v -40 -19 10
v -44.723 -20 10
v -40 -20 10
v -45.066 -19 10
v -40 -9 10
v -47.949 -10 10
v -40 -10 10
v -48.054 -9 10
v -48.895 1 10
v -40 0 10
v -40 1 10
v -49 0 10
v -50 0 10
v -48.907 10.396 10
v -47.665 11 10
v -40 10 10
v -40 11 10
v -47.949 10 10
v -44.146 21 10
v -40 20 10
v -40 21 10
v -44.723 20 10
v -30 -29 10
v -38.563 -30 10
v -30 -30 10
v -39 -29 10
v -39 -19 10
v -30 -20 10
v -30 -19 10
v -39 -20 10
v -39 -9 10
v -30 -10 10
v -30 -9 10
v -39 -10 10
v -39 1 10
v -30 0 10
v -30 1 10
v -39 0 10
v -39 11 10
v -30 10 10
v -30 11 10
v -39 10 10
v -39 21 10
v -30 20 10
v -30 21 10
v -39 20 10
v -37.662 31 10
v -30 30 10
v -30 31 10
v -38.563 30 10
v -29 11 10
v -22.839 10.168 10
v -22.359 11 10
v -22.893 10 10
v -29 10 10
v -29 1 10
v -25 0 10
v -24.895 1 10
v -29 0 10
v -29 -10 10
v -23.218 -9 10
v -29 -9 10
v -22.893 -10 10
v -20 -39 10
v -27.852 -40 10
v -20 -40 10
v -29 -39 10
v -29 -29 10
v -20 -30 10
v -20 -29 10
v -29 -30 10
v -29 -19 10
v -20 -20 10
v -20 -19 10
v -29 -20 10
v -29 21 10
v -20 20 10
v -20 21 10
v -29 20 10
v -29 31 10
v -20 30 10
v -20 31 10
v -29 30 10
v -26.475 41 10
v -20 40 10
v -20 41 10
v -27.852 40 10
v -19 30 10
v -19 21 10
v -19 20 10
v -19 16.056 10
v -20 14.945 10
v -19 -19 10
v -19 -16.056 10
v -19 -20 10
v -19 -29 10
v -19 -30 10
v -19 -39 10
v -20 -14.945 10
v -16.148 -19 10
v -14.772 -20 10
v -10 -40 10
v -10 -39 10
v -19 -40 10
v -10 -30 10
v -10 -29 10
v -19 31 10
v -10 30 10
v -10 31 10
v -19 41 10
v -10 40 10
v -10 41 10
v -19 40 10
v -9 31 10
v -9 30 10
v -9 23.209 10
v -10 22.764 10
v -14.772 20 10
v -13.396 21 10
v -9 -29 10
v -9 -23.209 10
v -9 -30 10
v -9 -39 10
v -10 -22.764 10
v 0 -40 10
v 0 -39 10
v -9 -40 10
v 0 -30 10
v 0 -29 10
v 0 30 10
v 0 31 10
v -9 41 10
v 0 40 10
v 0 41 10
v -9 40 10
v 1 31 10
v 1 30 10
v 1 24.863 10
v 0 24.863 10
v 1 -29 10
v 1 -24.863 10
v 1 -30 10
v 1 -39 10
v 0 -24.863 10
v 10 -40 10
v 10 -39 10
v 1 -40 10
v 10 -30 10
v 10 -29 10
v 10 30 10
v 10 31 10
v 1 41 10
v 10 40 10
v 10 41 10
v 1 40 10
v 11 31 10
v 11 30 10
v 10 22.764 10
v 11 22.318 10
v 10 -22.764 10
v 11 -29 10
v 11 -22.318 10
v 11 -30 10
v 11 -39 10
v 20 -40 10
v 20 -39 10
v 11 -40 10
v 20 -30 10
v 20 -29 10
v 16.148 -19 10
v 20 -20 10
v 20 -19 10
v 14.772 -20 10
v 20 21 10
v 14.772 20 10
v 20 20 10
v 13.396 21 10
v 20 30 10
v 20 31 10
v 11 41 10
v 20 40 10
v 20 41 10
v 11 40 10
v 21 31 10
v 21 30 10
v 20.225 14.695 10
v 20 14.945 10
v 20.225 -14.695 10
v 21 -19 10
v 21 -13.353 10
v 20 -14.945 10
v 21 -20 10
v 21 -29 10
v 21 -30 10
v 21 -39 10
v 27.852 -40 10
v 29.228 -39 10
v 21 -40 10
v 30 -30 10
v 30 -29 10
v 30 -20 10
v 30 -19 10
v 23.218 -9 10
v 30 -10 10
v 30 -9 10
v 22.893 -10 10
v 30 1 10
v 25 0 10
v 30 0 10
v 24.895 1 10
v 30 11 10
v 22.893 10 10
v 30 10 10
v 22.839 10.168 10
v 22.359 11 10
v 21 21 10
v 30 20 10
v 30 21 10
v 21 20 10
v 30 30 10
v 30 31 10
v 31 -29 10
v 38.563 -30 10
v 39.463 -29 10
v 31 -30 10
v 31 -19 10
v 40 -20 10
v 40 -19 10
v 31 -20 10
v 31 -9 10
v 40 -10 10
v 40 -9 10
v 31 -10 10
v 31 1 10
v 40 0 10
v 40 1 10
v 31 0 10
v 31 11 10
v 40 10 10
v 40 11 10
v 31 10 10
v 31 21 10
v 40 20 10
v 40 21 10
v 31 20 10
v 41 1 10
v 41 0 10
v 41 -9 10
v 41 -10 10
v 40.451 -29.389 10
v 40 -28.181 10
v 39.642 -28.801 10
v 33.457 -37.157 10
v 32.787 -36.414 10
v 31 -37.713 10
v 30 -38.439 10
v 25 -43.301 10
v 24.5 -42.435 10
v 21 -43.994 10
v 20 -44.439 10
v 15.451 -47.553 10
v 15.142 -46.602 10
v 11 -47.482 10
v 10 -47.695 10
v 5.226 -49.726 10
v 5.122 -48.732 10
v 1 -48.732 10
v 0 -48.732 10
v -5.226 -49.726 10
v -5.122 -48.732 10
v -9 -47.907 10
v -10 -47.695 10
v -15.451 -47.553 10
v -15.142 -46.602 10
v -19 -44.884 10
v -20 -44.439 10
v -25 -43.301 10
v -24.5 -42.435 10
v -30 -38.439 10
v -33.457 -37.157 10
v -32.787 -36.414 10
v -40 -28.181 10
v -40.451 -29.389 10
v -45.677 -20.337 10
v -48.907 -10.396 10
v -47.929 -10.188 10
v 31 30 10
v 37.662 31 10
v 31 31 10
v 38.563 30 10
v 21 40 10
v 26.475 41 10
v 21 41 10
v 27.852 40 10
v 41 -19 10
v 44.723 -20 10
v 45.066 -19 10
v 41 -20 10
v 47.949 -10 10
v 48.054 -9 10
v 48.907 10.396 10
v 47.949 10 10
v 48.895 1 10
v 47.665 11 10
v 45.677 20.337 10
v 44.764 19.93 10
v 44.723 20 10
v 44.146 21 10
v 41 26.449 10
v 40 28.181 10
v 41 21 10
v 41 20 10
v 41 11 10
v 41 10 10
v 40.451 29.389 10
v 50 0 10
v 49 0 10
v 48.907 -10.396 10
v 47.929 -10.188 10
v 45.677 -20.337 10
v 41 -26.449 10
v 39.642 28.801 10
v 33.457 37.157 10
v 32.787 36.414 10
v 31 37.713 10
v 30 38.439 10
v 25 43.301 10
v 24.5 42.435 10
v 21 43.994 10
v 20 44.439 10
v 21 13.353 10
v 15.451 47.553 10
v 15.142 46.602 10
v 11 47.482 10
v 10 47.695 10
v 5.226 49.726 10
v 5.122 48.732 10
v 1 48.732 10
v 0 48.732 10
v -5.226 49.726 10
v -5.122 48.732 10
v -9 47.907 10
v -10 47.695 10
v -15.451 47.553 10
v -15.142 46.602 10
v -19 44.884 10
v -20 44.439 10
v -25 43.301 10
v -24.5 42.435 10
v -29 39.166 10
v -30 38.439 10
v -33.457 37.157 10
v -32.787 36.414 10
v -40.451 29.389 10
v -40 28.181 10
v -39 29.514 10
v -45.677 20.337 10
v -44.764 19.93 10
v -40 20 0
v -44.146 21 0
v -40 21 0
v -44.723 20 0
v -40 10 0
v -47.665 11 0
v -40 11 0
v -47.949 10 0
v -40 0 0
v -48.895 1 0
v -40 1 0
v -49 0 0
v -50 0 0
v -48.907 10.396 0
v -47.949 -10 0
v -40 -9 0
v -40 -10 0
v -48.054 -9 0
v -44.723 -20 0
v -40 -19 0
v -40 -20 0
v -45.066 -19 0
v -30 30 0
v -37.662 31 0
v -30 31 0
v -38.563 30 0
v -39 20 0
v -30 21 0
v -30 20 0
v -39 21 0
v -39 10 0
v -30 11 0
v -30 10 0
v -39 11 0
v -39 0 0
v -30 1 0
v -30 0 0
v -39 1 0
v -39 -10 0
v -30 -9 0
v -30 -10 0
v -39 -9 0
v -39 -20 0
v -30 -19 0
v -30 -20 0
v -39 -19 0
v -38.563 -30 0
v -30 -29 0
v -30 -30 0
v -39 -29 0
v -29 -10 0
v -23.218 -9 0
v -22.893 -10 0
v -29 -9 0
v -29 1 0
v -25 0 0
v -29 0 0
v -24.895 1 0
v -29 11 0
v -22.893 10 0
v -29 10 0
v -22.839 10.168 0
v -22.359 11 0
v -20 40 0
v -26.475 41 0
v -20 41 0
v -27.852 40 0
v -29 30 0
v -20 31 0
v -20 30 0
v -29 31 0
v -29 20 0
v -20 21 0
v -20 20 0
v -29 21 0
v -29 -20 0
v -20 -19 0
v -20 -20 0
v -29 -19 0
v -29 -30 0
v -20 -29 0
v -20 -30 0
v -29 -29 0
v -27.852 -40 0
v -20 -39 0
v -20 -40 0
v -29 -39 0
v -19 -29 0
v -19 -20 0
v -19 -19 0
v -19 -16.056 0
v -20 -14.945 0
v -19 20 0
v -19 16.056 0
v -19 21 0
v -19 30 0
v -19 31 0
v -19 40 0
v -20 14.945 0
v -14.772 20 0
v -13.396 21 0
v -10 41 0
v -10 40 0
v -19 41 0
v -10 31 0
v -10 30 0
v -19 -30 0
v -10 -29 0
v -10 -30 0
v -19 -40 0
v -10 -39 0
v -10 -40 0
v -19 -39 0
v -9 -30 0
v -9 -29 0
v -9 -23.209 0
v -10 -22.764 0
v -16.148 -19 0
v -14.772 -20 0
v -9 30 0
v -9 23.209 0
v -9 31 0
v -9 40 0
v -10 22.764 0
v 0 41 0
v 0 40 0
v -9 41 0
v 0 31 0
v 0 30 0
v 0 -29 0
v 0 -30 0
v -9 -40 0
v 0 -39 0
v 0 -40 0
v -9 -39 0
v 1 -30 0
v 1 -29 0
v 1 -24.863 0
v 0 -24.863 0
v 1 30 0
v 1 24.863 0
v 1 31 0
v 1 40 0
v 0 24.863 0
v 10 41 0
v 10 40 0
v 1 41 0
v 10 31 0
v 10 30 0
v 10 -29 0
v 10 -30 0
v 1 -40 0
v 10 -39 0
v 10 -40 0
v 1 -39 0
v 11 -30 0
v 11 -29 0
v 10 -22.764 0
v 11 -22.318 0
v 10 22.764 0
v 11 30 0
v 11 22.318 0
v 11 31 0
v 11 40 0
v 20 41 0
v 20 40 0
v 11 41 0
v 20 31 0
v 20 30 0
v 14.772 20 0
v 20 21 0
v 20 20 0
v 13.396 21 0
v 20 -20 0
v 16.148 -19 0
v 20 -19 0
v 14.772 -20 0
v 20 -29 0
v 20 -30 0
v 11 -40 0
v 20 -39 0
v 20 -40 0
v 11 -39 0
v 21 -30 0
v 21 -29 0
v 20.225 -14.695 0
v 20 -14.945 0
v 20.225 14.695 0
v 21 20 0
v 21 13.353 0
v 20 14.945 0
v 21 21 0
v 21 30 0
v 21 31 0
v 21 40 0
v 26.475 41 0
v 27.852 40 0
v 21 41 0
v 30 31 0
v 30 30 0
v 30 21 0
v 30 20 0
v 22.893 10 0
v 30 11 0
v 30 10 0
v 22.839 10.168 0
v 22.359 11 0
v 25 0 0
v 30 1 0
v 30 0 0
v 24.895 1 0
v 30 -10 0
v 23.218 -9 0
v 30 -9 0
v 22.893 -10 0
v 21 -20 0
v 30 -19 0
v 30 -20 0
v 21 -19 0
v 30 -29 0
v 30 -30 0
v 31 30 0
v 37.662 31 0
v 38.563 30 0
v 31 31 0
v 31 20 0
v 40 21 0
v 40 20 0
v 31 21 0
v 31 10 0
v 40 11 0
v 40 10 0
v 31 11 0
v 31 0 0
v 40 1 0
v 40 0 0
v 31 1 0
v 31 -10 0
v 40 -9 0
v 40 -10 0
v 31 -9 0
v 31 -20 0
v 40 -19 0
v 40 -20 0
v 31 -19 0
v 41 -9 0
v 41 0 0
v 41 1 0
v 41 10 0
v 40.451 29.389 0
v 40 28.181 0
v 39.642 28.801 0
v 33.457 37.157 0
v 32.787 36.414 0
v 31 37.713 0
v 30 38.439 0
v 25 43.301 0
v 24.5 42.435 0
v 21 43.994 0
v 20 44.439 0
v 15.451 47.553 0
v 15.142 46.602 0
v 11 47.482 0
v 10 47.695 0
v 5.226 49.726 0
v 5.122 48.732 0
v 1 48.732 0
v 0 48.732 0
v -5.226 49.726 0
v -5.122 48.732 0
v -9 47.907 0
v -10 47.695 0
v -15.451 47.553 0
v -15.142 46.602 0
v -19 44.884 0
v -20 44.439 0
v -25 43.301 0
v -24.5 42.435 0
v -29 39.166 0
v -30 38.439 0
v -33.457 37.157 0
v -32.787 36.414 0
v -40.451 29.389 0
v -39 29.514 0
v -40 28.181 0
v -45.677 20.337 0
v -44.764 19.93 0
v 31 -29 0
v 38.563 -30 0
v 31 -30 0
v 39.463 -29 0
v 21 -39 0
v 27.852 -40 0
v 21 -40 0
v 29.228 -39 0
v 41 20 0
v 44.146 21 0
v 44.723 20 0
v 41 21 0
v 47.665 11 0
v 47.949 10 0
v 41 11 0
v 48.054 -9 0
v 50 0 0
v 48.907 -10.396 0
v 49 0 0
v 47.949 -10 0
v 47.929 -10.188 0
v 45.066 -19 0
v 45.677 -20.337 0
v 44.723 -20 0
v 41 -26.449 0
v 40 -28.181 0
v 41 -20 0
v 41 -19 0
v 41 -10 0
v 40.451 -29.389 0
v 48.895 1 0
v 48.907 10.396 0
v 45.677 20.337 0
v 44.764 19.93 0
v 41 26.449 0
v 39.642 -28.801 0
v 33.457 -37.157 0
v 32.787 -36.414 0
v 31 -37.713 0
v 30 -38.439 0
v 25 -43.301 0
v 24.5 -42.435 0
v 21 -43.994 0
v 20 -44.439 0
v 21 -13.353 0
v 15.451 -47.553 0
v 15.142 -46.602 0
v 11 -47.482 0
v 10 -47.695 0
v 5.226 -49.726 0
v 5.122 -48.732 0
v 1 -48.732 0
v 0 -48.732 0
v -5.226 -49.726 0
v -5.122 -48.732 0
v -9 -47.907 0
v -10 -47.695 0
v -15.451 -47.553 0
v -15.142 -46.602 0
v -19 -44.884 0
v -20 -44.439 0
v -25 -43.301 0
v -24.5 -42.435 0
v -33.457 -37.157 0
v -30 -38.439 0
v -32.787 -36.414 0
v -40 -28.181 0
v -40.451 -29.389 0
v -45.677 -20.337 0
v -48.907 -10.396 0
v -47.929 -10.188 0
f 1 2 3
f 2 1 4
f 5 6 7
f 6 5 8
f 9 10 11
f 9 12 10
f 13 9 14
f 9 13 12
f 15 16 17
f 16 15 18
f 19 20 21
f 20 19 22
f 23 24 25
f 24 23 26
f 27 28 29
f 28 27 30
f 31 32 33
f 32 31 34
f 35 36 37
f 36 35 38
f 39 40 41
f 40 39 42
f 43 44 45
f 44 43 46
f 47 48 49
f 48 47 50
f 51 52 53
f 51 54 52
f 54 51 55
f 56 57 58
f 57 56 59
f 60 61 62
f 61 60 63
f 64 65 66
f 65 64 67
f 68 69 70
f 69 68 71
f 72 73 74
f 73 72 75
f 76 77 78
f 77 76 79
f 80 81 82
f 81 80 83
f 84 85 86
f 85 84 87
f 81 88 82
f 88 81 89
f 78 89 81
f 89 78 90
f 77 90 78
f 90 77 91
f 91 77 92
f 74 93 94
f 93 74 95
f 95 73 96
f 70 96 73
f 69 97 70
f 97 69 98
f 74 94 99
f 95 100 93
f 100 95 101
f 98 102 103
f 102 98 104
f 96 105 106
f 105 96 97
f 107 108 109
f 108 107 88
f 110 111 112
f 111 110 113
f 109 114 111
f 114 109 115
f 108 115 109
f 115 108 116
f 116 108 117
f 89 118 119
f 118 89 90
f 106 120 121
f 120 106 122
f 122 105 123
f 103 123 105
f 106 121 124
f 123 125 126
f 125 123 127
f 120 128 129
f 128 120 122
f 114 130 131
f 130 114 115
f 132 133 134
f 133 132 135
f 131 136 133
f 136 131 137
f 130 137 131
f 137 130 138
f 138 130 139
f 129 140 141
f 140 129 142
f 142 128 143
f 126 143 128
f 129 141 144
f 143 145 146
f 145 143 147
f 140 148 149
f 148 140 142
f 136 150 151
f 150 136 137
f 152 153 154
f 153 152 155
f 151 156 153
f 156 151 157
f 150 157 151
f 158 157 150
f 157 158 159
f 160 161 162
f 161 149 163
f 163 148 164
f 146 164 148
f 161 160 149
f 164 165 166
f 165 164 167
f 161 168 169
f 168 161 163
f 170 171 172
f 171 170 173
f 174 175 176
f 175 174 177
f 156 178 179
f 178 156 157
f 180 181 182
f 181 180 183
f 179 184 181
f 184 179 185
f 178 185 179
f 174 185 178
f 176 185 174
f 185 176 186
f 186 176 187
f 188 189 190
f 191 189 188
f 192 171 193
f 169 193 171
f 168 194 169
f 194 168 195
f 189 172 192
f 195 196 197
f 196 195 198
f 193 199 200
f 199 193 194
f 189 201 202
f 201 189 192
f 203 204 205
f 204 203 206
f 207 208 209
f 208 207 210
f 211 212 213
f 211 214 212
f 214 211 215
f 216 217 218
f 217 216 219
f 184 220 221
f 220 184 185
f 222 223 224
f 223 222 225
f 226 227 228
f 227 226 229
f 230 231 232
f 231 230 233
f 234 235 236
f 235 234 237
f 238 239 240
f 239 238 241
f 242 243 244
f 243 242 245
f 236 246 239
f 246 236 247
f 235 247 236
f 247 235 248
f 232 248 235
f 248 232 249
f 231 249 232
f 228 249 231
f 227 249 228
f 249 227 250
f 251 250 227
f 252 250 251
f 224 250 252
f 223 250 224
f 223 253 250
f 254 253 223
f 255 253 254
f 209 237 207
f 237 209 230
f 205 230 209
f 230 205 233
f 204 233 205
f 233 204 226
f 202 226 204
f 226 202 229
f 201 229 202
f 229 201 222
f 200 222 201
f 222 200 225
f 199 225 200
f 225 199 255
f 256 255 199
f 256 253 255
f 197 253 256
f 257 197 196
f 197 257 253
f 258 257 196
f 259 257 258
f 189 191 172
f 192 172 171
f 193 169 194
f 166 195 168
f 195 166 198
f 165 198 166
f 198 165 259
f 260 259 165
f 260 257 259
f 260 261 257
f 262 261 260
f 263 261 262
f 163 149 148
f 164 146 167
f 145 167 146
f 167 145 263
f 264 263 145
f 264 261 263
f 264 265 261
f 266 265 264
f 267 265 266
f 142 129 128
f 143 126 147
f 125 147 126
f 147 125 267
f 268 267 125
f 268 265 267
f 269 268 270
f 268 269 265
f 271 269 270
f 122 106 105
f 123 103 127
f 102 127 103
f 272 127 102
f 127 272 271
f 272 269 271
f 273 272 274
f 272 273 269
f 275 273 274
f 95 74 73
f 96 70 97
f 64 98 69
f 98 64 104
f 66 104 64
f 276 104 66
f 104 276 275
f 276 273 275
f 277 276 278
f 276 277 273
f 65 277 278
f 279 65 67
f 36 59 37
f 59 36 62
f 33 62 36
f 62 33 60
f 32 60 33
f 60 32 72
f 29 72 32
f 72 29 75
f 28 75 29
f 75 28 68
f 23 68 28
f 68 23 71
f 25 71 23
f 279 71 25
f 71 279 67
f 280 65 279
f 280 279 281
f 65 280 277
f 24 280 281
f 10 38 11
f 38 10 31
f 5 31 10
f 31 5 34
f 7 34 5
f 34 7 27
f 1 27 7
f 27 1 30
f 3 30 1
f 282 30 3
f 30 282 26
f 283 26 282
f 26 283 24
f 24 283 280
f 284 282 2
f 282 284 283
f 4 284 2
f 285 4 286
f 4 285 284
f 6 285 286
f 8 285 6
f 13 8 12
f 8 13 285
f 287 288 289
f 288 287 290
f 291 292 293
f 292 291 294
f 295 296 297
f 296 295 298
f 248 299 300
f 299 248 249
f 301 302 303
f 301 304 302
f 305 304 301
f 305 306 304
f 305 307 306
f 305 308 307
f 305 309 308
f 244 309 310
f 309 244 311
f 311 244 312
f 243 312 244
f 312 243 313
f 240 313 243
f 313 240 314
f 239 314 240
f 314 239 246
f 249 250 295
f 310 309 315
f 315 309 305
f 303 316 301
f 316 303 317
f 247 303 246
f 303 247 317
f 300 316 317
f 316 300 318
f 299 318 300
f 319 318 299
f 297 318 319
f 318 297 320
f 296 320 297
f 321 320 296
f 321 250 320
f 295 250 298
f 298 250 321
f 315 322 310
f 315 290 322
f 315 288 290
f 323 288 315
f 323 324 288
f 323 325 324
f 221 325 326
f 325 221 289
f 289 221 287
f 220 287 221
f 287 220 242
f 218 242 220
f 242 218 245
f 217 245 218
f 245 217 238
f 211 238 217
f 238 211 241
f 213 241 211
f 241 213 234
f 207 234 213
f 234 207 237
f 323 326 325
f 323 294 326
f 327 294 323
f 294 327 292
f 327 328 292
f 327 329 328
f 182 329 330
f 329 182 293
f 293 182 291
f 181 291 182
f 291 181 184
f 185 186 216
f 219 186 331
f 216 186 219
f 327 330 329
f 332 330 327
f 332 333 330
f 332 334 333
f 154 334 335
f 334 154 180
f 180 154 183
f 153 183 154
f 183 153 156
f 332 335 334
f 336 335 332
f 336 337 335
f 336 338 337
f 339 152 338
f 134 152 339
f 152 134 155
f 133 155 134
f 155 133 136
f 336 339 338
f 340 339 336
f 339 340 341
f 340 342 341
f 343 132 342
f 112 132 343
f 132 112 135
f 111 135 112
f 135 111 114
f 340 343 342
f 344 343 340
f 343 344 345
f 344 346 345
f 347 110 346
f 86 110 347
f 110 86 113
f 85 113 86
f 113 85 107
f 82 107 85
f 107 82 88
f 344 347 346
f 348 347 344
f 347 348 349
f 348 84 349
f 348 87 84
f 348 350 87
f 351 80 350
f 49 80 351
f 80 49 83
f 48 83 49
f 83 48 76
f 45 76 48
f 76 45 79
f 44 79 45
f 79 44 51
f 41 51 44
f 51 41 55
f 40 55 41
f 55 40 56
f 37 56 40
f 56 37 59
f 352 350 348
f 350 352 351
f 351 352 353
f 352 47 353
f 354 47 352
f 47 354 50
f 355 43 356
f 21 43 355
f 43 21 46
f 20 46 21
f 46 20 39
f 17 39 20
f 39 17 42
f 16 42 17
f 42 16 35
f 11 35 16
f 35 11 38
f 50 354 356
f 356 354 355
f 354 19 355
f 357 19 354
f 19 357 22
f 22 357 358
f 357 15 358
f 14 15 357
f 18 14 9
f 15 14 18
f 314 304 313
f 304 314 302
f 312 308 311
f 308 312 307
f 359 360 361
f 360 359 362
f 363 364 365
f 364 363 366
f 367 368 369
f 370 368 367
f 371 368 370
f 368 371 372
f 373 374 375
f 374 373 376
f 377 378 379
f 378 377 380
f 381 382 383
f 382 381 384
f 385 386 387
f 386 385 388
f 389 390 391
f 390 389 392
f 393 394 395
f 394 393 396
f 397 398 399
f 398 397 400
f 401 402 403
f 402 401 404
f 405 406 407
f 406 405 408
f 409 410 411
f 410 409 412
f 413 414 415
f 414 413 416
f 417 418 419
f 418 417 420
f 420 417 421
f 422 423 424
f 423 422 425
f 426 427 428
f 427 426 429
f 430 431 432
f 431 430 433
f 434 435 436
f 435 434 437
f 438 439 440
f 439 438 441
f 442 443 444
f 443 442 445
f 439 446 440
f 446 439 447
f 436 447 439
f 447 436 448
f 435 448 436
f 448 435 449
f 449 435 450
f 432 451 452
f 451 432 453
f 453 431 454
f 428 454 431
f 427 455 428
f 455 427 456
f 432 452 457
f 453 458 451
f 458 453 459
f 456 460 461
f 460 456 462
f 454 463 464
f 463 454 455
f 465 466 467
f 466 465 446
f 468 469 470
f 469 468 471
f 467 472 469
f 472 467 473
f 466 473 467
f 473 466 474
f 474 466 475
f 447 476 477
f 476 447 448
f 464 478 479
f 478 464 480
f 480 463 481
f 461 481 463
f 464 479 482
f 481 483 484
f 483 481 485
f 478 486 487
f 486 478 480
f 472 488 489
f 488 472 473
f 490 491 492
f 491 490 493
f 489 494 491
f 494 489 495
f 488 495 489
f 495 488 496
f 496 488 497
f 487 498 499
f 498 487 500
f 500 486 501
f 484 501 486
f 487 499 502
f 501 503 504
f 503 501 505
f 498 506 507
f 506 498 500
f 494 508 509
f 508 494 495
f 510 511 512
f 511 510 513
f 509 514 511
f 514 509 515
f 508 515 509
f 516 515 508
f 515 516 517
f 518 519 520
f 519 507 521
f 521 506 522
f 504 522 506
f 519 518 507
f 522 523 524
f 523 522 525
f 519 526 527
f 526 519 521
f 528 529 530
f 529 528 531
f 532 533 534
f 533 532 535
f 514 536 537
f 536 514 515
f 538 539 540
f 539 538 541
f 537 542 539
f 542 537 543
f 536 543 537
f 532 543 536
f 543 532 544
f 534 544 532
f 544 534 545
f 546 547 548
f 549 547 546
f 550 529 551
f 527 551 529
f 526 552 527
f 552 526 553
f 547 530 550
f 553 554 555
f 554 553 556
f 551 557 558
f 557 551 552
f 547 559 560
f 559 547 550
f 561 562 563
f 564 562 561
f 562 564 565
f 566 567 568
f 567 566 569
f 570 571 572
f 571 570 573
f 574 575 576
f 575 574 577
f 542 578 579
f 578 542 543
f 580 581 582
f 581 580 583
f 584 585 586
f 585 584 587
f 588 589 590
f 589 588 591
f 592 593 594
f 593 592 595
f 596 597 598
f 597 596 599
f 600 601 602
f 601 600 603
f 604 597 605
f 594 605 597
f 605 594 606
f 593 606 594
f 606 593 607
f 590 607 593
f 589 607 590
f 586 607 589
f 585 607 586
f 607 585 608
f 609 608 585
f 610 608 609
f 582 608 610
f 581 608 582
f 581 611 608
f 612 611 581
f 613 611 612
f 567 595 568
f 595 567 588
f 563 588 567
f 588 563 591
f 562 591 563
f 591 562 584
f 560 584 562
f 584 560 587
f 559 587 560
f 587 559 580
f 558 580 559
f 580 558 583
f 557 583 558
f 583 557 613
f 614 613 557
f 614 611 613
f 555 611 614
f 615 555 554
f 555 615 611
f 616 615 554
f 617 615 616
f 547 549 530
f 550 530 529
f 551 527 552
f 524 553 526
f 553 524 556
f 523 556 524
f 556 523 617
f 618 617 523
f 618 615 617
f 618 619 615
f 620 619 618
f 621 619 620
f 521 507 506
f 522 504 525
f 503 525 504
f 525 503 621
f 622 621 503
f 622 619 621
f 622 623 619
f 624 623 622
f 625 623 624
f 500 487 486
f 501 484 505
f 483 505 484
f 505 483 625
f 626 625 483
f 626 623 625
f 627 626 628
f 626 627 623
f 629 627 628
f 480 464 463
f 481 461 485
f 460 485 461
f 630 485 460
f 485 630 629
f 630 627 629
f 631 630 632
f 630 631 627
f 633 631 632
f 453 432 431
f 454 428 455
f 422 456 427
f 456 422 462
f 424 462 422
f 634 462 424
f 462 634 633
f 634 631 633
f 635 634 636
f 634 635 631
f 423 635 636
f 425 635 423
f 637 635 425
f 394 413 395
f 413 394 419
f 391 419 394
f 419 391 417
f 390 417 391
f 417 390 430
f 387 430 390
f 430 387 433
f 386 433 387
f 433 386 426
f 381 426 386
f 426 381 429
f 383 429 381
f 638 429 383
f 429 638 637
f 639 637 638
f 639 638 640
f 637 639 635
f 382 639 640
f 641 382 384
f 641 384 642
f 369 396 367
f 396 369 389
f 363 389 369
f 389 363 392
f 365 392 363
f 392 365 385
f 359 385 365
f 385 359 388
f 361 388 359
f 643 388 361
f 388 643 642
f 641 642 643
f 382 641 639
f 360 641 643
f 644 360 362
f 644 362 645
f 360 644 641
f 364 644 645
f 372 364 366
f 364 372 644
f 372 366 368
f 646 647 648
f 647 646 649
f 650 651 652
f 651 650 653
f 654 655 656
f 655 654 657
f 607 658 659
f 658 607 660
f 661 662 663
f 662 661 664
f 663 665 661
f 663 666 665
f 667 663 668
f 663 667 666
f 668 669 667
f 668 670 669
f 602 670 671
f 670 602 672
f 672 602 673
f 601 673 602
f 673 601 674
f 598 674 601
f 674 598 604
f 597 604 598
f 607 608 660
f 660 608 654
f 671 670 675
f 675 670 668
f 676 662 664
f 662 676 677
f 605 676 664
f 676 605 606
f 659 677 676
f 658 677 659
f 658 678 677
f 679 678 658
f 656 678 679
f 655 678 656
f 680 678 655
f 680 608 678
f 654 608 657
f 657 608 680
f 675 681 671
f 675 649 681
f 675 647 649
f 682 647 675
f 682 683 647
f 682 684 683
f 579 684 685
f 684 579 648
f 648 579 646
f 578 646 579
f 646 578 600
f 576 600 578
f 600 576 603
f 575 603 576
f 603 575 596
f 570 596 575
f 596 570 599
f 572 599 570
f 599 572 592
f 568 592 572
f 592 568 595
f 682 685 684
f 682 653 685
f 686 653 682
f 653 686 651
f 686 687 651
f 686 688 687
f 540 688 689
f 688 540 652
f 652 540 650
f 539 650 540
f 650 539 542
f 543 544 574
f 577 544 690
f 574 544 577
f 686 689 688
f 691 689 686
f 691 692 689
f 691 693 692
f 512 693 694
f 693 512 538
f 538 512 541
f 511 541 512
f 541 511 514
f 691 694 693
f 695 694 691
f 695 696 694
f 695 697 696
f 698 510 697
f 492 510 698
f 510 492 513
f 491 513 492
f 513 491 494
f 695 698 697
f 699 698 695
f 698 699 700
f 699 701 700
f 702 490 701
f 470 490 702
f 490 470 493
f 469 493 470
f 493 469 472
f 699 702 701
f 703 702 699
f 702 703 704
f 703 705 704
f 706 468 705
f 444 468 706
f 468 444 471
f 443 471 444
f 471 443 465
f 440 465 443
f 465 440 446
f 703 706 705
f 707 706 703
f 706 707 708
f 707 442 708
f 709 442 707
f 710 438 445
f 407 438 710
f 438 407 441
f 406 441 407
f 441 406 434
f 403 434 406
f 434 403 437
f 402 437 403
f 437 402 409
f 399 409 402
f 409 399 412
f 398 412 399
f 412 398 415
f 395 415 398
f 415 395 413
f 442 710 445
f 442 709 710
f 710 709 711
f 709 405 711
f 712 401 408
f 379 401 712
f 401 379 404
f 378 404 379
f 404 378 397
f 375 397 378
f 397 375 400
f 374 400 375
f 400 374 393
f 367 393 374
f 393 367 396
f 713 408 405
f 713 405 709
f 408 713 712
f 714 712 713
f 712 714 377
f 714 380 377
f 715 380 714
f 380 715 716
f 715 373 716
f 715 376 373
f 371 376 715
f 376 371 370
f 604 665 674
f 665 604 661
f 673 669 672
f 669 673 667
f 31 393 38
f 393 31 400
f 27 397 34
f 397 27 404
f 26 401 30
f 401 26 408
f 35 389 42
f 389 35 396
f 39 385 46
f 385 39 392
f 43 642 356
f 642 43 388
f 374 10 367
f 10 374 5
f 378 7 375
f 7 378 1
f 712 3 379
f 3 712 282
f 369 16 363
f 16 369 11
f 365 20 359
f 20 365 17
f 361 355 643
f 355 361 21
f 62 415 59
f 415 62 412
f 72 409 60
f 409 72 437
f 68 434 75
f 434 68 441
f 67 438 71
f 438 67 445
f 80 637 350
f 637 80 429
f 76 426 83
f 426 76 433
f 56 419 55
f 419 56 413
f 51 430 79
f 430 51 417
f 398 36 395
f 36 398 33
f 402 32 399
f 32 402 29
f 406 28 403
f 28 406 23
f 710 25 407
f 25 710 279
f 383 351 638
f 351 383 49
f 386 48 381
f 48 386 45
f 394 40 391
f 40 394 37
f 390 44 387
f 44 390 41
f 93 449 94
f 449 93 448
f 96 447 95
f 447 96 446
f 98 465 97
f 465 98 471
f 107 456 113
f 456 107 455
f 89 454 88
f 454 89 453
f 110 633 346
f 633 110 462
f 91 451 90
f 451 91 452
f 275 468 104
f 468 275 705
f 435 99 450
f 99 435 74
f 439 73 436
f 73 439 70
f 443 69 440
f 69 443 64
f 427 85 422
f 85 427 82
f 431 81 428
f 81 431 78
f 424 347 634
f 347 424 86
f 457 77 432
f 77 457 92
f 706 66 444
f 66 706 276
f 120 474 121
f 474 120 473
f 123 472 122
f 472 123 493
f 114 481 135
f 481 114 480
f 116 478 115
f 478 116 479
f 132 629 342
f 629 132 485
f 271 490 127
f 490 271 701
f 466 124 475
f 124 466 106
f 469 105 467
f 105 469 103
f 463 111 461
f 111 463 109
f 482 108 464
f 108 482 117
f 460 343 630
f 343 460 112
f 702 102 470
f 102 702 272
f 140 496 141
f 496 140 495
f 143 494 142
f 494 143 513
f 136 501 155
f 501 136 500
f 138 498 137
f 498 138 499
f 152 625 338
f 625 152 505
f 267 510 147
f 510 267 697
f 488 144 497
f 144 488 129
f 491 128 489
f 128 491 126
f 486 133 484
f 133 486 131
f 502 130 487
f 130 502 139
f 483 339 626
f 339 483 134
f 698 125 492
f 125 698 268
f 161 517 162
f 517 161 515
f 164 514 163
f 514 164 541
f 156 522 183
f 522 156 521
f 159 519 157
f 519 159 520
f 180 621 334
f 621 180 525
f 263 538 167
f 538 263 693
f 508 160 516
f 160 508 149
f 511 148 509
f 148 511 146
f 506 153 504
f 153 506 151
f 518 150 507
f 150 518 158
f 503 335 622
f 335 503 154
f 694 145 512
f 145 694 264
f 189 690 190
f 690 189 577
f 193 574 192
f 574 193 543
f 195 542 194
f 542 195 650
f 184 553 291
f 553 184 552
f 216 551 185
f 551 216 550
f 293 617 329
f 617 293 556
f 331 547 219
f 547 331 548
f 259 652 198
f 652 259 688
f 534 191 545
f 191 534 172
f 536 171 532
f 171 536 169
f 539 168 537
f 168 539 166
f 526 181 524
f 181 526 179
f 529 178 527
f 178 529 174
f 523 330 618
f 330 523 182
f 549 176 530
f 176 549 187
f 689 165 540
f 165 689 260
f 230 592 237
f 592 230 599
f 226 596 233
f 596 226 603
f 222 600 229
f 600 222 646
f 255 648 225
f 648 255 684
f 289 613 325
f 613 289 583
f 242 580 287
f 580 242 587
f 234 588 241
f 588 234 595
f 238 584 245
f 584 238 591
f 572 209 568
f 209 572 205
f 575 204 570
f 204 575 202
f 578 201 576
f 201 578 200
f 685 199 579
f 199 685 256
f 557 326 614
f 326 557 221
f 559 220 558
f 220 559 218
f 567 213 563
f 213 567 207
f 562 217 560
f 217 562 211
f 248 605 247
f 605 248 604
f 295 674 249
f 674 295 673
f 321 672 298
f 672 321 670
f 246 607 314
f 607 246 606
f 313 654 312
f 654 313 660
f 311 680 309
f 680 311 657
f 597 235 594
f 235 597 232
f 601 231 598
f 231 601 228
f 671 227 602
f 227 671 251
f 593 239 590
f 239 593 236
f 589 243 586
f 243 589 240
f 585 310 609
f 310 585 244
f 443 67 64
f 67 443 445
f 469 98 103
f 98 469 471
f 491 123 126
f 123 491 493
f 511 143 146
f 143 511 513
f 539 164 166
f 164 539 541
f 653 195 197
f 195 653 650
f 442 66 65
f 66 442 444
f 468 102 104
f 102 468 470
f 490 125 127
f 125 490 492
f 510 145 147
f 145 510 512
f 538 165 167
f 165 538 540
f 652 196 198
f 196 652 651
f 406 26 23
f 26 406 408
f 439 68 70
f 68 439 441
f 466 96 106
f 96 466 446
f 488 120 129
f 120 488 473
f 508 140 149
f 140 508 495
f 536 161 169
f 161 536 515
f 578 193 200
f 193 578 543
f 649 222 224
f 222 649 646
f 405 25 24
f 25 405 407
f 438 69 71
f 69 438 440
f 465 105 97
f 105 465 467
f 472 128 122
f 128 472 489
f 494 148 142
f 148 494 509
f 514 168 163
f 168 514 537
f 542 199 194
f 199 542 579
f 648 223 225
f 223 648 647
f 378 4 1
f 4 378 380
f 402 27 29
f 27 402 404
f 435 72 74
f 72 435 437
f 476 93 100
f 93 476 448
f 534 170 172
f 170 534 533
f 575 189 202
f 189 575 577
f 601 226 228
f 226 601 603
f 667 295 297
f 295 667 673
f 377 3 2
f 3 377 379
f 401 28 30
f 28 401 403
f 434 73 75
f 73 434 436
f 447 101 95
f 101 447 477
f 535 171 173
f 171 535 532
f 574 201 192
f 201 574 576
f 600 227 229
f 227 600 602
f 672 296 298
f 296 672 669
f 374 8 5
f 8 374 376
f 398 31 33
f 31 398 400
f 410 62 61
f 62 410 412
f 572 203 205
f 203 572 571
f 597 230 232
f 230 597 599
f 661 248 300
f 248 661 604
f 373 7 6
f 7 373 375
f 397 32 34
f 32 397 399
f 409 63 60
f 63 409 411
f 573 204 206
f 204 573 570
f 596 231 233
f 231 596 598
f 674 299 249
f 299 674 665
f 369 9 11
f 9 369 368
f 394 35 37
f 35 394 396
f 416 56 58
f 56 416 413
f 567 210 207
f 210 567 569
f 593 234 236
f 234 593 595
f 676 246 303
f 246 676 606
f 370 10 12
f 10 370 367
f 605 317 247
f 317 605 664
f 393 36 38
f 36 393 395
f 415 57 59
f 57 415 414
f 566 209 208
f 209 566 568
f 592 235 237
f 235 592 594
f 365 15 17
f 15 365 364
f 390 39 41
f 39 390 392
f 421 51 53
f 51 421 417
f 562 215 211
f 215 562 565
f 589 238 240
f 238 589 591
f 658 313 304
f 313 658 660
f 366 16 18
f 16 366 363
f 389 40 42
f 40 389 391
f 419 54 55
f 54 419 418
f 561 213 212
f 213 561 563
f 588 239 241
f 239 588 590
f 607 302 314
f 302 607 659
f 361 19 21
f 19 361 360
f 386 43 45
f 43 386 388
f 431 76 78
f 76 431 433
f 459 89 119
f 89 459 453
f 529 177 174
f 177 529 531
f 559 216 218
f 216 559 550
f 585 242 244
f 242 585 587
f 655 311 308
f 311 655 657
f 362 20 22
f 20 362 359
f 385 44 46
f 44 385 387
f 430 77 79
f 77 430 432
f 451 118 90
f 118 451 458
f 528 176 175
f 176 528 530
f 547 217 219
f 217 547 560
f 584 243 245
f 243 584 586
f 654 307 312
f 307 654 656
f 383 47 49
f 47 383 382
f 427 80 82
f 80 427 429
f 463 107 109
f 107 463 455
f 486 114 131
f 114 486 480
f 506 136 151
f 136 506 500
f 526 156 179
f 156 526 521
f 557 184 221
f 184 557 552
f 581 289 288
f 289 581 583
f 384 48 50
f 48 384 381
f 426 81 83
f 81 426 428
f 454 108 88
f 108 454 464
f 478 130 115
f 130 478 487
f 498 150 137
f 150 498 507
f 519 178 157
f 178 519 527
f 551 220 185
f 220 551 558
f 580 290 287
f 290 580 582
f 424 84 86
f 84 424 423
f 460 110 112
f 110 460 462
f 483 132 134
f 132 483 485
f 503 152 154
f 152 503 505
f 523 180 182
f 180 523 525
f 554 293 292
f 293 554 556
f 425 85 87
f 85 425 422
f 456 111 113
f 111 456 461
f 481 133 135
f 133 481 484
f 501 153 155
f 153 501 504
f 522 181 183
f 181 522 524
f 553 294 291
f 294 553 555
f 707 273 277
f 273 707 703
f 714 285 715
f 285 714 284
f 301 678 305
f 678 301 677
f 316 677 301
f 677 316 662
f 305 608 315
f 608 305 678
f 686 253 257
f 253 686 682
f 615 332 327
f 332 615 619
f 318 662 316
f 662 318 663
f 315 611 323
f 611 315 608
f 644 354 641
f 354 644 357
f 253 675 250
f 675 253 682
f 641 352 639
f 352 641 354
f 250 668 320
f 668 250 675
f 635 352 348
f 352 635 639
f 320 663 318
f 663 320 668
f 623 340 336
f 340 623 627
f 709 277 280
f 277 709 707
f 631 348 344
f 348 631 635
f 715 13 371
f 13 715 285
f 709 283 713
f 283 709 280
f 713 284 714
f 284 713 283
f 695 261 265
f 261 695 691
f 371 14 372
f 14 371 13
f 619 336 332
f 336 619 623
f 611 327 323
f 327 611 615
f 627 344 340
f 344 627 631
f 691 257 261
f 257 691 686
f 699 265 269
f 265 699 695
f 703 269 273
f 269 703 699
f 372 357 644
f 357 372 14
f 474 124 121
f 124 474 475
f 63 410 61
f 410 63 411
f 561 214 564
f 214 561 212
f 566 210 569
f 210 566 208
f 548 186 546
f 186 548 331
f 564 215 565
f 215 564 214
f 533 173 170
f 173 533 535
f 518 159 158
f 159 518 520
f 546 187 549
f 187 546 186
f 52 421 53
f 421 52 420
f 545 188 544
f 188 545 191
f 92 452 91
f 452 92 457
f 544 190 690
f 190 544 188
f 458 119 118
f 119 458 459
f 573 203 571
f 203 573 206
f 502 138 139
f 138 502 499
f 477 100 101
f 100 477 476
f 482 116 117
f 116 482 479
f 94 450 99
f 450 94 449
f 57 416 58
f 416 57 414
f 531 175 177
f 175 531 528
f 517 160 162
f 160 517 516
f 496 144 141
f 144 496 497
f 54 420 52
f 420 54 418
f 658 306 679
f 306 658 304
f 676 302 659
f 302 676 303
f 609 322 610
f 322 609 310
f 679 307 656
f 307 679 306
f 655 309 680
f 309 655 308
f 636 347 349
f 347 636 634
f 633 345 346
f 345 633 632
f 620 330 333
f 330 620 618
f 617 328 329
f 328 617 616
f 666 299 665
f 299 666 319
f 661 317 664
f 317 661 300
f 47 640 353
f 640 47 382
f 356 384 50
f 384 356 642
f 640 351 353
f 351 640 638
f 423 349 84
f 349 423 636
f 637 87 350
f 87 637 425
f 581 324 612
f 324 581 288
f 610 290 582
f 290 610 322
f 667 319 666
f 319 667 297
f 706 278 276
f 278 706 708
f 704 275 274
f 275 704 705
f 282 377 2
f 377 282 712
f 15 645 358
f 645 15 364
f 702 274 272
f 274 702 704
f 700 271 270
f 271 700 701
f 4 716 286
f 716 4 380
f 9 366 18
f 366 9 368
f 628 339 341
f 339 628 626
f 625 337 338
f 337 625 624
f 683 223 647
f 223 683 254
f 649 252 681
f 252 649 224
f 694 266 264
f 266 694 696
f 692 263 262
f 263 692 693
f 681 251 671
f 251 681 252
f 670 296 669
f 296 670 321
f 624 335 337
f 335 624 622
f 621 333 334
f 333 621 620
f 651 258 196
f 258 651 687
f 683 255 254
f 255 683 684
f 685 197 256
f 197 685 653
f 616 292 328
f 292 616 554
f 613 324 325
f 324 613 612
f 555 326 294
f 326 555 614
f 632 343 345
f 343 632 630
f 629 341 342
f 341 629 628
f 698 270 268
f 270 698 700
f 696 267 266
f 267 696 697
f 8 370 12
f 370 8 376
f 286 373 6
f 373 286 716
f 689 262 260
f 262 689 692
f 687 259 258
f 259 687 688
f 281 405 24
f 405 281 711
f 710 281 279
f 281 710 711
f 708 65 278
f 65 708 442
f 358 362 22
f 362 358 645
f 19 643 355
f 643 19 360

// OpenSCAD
	

     
     
    module circular_grid_fin(outer_d, inner_d, spacing, height, wall) {
            intersection () {
     
                    union () {
                            for (x = [0 : 9]) {
                                    translate([-(outer_d / 2) + x * spacing, -(outer_d / 2), 0])
                                    cube([wall, outer_d, height]);
                            }
     
                            for (y = [0 : 9]) {
                                    translate([-(outer_d / 2), -(outer_d / 2) + y * spacing, 0])
                                    cube([outer_d, wall, height]);
                            }
                    }
     
                    difference () {
                            cylinder(r = outer_d / 2, h = height);
                            translate([0, 0, -(height / 2)])
                            cylinder(r = inner_d / 2, h = height * 2);
                    }
     
            }
           
            difference () {
                    cylinder(r = outer_d / 2, h = height);
                   
                    translate([0, 0, -(height / 2)])
                    cylinder(r = (outer_d / 2) - wall, h = height * 2);
            }
    }
     
     
    circular_grid_fin(100, 50, 10, 10, 1);
